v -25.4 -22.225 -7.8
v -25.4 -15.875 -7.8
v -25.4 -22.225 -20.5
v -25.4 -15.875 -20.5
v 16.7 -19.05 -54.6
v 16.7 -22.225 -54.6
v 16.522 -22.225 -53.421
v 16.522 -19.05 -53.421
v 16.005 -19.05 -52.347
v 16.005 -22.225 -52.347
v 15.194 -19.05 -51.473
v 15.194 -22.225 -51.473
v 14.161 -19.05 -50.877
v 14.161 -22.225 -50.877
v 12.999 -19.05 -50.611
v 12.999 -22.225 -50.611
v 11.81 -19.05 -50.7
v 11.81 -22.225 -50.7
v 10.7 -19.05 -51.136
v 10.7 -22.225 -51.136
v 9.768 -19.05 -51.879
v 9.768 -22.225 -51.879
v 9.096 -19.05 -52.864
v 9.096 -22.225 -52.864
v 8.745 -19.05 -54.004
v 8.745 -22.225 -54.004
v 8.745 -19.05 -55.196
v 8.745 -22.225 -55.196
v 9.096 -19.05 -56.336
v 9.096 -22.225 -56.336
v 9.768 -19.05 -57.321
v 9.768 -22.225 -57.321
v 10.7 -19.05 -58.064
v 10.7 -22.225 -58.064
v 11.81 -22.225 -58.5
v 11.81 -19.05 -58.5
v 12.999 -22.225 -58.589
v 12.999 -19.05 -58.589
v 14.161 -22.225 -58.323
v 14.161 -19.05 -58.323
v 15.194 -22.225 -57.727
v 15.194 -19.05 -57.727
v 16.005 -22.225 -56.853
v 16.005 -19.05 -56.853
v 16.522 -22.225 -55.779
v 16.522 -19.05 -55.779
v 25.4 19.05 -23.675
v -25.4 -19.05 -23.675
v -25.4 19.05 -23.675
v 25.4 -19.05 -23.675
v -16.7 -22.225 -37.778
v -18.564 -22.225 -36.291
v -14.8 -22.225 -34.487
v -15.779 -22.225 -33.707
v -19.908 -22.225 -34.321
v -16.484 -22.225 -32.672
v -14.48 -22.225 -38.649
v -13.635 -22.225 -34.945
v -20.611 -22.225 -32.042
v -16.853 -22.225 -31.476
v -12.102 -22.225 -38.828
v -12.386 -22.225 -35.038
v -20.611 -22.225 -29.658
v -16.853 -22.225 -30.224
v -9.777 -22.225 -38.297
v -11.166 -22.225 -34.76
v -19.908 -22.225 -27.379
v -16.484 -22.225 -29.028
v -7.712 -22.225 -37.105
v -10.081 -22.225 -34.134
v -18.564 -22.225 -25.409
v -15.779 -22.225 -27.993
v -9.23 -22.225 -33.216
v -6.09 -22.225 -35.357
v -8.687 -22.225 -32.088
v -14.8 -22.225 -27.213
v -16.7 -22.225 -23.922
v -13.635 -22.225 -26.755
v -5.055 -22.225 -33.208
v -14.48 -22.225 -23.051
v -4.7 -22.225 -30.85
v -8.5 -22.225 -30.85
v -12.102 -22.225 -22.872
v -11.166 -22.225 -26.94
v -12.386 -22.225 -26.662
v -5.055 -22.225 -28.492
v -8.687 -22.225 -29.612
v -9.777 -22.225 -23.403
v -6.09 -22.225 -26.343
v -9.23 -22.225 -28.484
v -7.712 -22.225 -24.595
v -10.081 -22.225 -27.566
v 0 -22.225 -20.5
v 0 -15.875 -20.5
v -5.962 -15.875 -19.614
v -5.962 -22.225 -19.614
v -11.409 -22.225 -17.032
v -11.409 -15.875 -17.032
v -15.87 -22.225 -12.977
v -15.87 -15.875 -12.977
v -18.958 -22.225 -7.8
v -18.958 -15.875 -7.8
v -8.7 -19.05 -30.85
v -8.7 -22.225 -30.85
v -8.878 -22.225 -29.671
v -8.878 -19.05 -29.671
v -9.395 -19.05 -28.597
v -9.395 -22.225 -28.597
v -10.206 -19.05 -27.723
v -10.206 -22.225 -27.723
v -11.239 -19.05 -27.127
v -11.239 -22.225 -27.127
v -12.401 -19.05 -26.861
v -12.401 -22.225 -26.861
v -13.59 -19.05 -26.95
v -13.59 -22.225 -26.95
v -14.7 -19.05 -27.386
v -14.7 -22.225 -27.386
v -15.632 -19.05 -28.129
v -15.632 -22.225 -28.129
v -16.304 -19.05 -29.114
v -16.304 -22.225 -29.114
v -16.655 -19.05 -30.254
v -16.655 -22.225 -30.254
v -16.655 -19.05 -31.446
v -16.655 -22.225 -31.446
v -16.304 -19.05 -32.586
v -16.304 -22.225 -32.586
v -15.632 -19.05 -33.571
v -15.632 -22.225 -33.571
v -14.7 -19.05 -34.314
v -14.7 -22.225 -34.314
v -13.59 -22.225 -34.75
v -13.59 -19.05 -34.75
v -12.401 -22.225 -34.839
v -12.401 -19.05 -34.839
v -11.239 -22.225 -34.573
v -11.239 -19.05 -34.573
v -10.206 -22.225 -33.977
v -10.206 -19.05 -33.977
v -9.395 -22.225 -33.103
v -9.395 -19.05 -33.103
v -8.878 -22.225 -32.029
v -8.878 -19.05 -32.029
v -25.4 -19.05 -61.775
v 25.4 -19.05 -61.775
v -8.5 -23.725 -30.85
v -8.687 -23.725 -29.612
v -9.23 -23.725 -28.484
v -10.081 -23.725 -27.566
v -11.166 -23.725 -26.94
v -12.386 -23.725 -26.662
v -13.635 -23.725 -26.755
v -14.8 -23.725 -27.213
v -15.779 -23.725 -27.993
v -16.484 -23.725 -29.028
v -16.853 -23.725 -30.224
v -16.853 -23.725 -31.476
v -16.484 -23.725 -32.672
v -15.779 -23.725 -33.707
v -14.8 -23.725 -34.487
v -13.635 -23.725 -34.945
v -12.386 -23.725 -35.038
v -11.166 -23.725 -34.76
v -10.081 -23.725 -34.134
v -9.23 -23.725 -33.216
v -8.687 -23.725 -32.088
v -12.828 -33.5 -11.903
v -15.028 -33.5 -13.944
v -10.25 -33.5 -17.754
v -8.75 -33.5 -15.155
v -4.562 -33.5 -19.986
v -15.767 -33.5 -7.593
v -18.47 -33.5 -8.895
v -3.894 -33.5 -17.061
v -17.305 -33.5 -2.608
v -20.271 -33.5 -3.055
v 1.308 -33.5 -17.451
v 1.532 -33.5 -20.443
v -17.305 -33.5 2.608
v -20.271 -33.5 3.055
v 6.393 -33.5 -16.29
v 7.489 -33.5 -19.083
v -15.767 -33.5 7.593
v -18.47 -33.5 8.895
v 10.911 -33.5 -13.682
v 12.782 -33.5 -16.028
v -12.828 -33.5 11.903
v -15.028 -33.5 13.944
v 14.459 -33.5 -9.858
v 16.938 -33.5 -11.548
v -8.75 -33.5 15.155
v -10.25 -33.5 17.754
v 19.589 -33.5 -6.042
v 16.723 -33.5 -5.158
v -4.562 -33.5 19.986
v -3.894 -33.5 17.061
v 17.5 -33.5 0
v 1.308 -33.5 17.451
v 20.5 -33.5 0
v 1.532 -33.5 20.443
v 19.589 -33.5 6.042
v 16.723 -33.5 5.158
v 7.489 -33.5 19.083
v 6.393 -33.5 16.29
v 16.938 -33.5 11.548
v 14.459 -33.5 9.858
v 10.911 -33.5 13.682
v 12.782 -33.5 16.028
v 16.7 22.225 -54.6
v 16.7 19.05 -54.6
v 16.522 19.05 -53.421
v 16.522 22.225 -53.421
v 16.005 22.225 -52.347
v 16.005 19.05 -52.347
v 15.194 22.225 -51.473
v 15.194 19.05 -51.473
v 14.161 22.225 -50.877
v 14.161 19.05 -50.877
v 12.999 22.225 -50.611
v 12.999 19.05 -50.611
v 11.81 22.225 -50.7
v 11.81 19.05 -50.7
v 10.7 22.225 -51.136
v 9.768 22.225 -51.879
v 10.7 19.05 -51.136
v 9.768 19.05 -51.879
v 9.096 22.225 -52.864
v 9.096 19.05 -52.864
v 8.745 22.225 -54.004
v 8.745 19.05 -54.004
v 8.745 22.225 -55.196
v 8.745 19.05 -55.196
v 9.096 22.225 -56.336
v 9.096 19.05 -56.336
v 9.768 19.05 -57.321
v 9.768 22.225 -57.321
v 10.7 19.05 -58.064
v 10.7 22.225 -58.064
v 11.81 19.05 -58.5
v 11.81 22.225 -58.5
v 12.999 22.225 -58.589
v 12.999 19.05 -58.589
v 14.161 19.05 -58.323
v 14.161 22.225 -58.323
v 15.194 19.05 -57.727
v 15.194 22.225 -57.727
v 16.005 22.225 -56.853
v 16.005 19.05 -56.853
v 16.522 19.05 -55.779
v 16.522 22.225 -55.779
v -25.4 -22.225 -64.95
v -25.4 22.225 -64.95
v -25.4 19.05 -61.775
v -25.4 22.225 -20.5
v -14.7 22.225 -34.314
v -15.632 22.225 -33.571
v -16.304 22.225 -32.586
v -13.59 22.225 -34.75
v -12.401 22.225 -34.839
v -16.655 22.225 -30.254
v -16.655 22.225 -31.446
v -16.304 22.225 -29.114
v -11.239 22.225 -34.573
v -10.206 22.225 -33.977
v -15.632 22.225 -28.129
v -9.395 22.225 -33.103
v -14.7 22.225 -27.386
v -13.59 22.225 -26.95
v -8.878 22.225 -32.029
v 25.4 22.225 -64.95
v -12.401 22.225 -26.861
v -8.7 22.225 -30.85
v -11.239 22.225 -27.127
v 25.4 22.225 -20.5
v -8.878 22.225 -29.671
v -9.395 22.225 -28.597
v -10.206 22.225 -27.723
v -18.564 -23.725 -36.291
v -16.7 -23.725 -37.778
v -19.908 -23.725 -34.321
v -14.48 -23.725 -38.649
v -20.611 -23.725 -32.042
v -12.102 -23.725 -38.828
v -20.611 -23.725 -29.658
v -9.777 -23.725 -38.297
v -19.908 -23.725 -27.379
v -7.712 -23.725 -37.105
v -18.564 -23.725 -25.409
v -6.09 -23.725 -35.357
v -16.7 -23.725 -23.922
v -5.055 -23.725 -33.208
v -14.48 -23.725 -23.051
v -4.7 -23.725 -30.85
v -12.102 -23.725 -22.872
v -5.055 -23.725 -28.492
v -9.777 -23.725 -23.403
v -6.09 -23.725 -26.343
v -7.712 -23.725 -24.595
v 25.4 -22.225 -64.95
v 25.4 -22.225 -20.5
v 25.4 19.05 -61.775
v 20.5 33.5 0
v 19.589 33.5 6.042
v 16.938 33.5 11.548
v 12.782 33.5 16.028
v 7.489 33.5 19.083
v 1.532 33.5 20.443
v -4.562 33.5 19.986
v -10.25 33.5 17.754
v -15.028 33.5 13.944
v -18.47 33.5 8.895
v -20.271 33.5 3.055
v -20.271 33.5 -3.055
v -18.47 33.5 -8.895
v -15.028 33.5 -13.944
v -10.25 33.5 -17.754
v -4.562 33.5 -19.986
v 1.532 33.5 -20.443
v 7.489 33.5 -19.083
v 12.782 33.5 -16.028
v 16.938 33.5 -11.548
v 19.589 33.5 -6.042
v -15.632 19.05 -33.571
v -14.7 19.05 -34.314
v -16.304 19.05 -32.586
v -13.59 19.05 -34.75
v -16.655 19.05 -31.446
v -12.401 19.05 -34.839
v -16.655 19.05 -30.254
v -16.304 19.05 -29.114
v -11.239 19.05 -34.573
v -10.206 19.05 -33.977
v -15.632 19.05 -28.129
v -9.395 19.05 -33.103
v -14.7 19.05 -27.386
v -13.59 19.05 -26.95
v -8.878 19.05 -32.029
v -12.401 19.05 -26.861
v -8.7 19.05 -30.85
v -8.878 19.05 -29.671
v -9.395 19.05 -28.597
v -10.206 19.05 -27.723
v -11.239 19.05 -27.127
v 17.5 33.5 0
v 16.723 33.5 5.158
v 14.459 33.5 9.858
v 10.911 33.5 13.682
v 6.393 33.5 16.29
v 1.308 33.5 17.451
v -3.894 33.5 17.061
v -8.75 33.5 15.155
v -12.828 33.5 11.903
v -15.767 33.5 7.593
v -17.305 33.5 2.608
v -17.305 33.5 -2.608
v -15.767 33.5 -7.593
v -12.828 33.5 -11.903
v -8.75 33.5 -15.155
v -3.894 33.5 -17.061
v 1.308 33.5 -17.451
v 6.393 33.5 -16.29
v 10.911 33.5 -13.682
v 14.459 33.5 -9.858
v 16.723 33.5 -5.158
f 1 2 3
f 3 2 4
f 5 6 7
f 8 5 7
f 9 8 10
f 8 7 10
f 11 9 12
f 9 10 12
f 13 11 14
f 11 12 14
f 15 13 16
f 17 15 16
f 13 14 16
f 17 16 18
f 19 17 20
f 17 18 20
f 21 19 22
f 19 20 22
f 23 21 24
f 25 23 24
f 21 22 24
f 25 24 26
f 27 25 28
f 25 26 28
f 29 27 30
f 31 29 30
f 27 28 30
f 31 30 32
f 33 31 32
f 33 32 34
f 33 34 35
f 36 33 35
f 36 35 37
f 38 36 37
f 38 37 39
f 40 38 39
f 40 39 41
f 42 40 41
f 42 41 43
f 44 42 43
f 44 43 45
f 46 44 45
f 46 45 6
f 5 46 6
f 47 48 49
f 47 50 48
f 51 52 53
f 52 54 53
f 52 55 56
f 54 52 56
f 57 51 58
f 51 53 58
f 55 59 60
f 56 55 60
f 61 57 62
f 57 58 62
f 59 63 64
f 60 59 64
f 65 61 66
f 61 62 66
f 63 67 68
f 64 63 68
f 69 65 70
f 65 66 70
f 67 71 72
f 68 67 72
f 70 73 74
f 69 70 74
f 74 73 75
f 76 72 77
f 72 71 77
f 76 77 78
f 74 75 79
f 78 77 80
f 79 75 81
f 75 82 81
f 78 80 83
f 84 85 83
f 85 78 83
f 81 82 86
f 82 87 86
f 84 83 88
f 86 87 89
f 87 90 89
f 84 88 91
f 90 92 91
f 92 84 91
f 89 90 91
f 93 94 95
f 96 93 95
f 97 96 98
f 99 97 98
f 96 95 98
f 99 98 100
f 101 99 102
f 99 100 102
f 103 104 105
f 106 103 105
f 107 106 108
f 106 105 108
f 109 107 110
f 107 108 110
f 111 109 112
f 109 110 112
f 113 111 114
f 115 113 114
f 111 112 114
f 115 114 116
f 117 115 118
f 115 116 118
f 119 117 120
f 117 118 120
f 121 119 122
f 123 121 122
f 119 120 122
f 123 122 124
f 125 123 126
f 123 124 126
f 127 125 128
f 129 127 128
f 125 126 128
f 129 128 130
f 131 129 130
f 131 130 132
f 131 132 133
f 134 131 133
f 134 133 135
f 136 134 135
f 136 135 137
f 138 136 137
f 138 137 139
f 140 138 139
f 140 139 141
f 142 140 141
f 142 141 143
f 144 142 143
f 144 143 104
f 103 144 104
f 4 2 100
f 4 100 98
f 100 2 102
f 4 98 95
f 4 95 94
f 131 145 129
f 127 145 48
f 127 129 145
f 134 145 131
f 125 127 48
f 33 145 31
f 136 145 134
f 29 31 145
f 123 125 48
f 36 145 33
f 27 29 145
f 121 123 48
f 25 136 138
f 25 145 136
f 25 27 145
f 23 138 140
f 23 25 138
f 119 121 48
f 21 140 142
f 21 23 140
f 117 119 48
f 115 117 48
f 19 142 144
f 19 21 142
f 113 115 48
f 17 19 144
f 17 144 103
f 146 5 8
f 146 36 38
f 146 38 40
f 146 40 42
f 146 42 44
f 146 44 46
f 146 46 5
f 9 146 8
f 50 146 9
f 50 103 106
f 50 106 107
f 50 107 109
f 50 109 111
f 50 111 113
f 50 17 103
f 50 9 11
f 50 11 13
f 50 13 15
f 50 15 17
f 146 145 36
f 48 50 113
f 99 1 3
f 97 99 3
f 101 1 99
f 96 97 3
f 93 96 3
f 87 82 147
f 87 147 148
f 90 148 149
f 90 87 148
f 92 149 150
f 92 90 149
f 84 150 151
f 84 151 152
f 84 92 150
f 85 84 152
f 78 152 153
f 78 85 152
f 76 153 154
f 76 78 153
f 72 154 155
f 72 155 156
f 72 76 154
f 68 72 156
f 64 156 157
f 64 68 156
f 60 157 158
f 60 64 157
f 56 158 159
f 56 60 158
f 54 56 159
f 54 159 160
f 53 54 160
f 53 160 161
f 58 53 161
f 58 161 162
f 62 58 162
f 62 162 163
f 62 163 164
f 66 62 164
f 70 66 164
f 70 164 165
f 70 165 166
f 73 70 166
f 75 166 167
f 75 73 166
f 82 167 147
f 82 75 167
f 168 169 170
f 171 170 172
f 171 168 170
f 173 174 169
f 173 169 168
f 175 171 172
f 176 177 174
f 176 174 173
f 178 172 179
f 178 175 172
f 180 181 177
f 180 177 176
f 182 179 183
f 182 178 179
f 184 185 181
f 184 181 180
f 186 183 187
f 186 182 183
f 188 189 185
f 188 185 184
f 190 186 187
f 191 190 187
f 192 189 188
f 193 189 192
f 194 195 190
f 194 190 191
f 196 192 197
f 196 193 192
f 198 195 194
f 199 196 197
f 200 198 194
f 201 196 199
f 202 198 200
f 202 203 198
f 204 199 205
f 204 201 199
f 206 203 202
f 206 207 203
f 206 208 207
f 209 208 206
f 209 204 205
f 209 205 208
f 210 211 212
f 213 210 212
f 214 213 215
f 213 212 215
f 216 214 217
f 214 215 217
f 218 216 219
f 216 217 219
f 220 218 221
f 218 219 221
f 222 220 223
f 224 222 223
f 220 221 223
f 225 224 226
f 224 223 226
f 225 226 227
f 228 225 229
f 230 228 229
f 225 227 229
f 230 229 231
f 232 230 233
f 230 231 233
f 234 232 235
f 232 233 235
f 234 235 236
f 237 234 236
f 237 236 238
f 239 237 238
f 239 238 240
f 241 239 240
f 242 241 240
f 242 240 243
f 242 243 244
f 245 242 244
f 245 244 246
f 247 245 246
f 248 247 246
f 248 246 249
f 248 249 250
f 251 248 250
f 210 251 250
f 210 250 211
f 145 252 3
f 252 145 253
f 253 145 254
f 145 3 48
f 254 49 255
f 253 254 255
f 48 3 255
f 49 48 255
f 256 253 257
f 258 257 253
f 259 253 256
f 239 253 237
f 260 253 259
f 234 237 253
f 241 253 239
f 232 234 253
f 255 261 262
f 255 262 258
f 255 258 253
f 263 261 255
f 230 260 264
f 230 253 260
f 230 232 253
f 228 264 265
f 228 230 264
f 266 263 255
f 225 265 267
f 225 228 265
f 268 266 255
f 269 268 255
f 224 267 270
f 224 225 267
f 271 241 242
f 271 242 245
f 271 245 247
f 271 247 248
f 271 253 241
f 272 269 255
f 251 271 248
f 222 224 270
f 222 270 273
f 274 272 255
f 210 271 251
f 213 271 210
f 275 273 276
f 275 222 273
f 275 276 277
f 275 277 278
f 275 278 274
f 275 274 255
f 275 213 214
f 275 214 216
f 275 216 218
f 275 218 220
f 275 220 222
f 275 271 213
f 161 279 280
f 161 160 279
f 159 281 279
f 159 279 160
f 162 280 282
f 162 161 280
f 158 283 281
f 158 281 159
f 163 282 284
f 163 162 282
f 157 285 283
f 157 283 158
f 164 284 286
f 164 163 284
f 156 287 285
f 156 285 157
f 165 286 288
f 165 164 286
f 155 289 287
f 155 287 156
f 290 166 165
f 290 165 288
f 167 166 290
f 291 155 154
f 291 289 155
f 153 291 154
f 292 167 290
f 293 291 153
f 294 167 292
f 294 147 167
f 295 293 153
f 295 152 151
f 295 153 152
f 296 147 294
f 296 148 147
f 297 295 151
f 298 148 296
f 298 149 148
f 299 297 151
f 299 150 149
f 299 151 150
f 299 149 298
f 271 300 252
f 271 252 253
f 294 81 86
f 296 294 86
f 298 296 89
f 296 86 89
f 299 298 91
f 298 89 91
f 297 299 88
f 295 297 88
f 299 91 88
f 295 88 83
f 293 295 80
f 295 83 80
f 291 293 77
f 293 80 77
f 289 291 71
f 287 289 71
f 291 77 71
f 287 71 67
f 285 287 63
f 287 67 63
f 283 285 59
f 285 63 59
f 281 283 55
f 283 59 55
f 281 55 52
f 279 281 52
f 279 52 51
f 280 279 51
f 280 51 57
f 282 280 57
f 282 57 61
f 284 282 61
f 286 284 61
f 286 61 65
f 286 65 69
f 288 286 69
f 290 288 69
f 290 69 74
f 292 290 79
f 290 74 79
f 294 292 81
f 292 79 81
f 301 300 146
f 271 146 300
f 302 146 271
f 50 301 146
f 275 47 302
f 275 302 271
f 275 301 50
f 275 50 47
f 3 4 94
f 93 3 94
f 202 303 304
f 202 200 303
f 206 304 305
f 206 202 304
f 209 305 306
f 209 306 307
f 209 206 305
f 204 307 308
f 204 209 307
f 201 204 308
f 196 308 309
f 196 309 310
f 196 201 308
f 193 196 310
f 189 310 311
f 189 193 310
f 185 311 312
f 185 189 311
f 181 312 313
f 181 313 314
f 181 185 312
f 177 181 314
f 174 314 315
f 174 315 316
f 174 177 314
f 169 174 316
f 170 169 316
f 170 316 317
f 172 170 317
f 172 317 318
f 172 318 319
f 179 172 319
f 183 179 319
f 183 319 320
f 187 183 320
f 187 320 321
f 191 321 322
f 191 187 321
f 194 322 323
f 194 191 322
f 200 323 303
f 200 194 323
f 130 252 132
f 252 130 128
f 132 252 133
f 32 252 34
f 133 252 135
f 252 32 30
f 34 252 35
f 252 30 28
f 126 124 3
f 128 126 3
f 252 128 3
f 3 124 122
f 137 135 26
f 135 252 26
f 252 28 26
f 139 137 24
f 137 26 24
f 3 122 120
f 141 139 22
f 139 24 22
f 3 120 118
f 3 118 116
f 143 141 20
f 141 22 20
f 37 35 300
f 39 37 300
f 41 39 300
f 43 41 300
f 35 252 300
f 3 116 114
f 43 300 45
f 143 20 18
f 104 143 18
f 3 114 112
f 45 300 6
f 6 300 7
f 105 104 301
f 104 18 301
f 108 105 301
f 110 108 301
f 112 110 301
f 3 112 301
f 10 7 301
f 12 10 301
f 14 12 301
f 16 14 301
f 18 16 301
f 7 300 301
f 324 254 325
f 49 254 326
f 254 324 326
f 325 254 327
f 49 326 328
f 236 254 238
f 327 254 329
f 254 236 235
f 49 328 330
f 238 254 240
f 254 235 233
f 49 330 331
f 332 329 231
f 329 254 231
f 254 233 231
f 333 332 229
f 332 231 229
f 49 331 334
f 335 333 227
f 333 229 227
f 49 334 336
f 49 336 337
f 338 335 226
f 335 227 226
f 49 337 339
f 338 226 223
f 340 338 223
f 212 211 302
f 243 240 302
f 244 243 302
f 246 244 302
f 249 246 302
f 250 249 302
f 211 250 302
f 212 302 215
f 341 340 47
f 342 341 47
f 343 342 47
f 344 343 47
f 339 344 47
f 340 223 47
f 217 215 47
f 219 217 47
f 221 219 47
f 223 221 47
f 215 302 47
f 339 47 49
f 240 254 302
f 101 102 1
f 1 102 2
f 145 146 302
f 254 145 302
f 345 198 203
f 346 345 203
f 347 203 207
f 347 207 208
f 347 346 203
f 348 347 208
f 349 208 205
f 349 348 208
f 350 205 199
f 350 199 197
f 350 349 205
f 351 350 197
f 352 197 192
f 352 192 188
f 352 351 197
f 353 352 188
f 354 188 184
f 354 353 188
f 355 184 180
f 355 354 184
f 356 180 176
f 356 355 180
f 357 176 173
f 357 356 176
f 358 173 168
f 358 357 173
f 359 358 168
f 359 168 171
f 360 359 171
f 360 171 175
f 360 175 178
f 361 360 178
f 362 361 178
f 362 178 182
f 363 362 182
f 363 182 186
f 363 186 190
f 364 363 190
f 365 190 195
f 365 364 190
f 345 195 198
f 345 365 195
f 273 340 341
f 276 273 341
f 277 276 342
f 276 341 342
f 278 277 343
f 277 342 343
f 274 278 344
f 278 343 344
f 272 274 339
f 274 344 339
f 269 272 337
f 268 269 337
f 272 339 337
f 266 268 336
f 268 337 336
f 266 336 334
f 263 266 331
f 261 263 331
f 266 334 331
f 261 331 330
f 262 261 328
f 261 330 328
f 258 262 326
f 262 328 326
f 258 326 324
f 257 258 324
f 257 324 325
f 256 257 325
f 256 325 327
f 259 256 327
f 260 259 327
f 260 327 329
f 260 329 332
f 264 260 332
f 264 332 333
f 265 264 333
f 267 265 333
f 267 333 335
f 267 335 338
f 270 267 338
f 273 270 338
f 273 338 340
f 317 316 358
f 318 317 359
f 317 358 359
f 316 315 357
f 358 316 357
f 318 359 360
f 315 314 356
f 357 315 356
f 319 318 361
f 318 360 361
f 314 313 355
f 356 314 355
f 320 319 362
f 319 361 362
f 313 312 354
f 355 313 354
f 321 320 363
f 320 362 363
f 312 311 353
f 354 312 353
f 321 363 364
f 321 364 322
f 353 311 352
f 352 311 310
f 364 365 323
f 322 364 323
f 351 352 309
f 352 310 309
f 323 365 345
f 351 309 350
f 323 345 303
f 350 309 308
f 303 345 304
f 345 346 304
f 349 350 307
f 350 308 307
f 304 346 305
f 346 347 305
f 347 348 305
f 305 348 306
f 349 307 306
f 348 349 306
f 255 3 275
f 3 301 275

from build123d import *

# Parameters (mm, degrees)
F0_R          = 20.5
F0_R_2        = 17.5
F1_DEPTH      = 33.5
F2_W          = 44.45
F2_H          = 44.45
F2_W_2        = 38.1
F2_H_2        = 38.1
F3_DEPTH      = 25.4
F3_DEPTH_BACK = 25.4
F4_R          = 4
F5_DEPTH      = 55.726
F7_START      = 15.875
F7_DEPTH      = 6.35
F8_R          = 8
F8_R_2        = 4.2
F9_DEPTH      = 1.5


with BuildPart() as f1:
    # F0 (on Front) → F1 (new body, symmetric)
    with BuildSketch(Plane.XZ):
        Circle(F0_R)
        Circle(F0_R_2, mode=Mode.SUBTRACT)
    extrude(amount=F1_DEPTH, both=True)


with BuildPart() as f3:
    # F2 (on Right) → F3 (new body, two sides)
    with BuildSketch(Plane.YZ) as f3_sk:
        with Locations((0, -42.725)):
            Rectangle(F2_W, F2_H)
        with Locations((0, -42.725)):
            Rectangle(F2_W_2, F2_H_2, mode=Mode.SUBTRACT)
    extrude(amount=F3_DEPTH)
    extrude(f3_sk.sketch, amount=-F3_DEPTH_BACK)

    # F4 (on face) → F5 (cut, through all)
    with BuildSketch(Plane.XZ.offset(22.225)):
        with Locations((-12.7, -30.85)):
            Circle(F4_R)
        with Locations((12.7, -54.6)):
            Circle(F4_R)
    extrude(amount=-F5_DEPTH, mode=Mode.SUBTRACT)


with BuildPart() as f7:
    # F6 (on Front) → F7 (new body)
    with BuildSketch(Plane.XZ.offset(F7_START)):
        with BuildLine():
            Line((-25.4, -20.5), (0, -20.5))
            ThreePointArc((0, -20.5), (-11.4094259277, -17.0315882994), (-18.9581117203, -7.8))
            Line((-18.9581117203, -7.8), (-25.4, -7.8))
            Line((-25.4, -7.8), (-25.4, -20.5))
        make_face()
    extrude(amount=F7_DEPTH)


with BuildPart() as f9:
    # F8 (on face) → F9 (new body)
    with BuildSketch(Plane.XZ.offset(22.225)):
        with Locations((-12.7, -30.85)):
            Circle(F8_R)
        with Locations((-12.7, -30.85)):
            Circle(F8_R_2, mode=Mode.SUBTRACT)
    extrude(amount=F9_DEPTH)


solid = Compound([f1.part, f3.part, f7.part, f9.part])
